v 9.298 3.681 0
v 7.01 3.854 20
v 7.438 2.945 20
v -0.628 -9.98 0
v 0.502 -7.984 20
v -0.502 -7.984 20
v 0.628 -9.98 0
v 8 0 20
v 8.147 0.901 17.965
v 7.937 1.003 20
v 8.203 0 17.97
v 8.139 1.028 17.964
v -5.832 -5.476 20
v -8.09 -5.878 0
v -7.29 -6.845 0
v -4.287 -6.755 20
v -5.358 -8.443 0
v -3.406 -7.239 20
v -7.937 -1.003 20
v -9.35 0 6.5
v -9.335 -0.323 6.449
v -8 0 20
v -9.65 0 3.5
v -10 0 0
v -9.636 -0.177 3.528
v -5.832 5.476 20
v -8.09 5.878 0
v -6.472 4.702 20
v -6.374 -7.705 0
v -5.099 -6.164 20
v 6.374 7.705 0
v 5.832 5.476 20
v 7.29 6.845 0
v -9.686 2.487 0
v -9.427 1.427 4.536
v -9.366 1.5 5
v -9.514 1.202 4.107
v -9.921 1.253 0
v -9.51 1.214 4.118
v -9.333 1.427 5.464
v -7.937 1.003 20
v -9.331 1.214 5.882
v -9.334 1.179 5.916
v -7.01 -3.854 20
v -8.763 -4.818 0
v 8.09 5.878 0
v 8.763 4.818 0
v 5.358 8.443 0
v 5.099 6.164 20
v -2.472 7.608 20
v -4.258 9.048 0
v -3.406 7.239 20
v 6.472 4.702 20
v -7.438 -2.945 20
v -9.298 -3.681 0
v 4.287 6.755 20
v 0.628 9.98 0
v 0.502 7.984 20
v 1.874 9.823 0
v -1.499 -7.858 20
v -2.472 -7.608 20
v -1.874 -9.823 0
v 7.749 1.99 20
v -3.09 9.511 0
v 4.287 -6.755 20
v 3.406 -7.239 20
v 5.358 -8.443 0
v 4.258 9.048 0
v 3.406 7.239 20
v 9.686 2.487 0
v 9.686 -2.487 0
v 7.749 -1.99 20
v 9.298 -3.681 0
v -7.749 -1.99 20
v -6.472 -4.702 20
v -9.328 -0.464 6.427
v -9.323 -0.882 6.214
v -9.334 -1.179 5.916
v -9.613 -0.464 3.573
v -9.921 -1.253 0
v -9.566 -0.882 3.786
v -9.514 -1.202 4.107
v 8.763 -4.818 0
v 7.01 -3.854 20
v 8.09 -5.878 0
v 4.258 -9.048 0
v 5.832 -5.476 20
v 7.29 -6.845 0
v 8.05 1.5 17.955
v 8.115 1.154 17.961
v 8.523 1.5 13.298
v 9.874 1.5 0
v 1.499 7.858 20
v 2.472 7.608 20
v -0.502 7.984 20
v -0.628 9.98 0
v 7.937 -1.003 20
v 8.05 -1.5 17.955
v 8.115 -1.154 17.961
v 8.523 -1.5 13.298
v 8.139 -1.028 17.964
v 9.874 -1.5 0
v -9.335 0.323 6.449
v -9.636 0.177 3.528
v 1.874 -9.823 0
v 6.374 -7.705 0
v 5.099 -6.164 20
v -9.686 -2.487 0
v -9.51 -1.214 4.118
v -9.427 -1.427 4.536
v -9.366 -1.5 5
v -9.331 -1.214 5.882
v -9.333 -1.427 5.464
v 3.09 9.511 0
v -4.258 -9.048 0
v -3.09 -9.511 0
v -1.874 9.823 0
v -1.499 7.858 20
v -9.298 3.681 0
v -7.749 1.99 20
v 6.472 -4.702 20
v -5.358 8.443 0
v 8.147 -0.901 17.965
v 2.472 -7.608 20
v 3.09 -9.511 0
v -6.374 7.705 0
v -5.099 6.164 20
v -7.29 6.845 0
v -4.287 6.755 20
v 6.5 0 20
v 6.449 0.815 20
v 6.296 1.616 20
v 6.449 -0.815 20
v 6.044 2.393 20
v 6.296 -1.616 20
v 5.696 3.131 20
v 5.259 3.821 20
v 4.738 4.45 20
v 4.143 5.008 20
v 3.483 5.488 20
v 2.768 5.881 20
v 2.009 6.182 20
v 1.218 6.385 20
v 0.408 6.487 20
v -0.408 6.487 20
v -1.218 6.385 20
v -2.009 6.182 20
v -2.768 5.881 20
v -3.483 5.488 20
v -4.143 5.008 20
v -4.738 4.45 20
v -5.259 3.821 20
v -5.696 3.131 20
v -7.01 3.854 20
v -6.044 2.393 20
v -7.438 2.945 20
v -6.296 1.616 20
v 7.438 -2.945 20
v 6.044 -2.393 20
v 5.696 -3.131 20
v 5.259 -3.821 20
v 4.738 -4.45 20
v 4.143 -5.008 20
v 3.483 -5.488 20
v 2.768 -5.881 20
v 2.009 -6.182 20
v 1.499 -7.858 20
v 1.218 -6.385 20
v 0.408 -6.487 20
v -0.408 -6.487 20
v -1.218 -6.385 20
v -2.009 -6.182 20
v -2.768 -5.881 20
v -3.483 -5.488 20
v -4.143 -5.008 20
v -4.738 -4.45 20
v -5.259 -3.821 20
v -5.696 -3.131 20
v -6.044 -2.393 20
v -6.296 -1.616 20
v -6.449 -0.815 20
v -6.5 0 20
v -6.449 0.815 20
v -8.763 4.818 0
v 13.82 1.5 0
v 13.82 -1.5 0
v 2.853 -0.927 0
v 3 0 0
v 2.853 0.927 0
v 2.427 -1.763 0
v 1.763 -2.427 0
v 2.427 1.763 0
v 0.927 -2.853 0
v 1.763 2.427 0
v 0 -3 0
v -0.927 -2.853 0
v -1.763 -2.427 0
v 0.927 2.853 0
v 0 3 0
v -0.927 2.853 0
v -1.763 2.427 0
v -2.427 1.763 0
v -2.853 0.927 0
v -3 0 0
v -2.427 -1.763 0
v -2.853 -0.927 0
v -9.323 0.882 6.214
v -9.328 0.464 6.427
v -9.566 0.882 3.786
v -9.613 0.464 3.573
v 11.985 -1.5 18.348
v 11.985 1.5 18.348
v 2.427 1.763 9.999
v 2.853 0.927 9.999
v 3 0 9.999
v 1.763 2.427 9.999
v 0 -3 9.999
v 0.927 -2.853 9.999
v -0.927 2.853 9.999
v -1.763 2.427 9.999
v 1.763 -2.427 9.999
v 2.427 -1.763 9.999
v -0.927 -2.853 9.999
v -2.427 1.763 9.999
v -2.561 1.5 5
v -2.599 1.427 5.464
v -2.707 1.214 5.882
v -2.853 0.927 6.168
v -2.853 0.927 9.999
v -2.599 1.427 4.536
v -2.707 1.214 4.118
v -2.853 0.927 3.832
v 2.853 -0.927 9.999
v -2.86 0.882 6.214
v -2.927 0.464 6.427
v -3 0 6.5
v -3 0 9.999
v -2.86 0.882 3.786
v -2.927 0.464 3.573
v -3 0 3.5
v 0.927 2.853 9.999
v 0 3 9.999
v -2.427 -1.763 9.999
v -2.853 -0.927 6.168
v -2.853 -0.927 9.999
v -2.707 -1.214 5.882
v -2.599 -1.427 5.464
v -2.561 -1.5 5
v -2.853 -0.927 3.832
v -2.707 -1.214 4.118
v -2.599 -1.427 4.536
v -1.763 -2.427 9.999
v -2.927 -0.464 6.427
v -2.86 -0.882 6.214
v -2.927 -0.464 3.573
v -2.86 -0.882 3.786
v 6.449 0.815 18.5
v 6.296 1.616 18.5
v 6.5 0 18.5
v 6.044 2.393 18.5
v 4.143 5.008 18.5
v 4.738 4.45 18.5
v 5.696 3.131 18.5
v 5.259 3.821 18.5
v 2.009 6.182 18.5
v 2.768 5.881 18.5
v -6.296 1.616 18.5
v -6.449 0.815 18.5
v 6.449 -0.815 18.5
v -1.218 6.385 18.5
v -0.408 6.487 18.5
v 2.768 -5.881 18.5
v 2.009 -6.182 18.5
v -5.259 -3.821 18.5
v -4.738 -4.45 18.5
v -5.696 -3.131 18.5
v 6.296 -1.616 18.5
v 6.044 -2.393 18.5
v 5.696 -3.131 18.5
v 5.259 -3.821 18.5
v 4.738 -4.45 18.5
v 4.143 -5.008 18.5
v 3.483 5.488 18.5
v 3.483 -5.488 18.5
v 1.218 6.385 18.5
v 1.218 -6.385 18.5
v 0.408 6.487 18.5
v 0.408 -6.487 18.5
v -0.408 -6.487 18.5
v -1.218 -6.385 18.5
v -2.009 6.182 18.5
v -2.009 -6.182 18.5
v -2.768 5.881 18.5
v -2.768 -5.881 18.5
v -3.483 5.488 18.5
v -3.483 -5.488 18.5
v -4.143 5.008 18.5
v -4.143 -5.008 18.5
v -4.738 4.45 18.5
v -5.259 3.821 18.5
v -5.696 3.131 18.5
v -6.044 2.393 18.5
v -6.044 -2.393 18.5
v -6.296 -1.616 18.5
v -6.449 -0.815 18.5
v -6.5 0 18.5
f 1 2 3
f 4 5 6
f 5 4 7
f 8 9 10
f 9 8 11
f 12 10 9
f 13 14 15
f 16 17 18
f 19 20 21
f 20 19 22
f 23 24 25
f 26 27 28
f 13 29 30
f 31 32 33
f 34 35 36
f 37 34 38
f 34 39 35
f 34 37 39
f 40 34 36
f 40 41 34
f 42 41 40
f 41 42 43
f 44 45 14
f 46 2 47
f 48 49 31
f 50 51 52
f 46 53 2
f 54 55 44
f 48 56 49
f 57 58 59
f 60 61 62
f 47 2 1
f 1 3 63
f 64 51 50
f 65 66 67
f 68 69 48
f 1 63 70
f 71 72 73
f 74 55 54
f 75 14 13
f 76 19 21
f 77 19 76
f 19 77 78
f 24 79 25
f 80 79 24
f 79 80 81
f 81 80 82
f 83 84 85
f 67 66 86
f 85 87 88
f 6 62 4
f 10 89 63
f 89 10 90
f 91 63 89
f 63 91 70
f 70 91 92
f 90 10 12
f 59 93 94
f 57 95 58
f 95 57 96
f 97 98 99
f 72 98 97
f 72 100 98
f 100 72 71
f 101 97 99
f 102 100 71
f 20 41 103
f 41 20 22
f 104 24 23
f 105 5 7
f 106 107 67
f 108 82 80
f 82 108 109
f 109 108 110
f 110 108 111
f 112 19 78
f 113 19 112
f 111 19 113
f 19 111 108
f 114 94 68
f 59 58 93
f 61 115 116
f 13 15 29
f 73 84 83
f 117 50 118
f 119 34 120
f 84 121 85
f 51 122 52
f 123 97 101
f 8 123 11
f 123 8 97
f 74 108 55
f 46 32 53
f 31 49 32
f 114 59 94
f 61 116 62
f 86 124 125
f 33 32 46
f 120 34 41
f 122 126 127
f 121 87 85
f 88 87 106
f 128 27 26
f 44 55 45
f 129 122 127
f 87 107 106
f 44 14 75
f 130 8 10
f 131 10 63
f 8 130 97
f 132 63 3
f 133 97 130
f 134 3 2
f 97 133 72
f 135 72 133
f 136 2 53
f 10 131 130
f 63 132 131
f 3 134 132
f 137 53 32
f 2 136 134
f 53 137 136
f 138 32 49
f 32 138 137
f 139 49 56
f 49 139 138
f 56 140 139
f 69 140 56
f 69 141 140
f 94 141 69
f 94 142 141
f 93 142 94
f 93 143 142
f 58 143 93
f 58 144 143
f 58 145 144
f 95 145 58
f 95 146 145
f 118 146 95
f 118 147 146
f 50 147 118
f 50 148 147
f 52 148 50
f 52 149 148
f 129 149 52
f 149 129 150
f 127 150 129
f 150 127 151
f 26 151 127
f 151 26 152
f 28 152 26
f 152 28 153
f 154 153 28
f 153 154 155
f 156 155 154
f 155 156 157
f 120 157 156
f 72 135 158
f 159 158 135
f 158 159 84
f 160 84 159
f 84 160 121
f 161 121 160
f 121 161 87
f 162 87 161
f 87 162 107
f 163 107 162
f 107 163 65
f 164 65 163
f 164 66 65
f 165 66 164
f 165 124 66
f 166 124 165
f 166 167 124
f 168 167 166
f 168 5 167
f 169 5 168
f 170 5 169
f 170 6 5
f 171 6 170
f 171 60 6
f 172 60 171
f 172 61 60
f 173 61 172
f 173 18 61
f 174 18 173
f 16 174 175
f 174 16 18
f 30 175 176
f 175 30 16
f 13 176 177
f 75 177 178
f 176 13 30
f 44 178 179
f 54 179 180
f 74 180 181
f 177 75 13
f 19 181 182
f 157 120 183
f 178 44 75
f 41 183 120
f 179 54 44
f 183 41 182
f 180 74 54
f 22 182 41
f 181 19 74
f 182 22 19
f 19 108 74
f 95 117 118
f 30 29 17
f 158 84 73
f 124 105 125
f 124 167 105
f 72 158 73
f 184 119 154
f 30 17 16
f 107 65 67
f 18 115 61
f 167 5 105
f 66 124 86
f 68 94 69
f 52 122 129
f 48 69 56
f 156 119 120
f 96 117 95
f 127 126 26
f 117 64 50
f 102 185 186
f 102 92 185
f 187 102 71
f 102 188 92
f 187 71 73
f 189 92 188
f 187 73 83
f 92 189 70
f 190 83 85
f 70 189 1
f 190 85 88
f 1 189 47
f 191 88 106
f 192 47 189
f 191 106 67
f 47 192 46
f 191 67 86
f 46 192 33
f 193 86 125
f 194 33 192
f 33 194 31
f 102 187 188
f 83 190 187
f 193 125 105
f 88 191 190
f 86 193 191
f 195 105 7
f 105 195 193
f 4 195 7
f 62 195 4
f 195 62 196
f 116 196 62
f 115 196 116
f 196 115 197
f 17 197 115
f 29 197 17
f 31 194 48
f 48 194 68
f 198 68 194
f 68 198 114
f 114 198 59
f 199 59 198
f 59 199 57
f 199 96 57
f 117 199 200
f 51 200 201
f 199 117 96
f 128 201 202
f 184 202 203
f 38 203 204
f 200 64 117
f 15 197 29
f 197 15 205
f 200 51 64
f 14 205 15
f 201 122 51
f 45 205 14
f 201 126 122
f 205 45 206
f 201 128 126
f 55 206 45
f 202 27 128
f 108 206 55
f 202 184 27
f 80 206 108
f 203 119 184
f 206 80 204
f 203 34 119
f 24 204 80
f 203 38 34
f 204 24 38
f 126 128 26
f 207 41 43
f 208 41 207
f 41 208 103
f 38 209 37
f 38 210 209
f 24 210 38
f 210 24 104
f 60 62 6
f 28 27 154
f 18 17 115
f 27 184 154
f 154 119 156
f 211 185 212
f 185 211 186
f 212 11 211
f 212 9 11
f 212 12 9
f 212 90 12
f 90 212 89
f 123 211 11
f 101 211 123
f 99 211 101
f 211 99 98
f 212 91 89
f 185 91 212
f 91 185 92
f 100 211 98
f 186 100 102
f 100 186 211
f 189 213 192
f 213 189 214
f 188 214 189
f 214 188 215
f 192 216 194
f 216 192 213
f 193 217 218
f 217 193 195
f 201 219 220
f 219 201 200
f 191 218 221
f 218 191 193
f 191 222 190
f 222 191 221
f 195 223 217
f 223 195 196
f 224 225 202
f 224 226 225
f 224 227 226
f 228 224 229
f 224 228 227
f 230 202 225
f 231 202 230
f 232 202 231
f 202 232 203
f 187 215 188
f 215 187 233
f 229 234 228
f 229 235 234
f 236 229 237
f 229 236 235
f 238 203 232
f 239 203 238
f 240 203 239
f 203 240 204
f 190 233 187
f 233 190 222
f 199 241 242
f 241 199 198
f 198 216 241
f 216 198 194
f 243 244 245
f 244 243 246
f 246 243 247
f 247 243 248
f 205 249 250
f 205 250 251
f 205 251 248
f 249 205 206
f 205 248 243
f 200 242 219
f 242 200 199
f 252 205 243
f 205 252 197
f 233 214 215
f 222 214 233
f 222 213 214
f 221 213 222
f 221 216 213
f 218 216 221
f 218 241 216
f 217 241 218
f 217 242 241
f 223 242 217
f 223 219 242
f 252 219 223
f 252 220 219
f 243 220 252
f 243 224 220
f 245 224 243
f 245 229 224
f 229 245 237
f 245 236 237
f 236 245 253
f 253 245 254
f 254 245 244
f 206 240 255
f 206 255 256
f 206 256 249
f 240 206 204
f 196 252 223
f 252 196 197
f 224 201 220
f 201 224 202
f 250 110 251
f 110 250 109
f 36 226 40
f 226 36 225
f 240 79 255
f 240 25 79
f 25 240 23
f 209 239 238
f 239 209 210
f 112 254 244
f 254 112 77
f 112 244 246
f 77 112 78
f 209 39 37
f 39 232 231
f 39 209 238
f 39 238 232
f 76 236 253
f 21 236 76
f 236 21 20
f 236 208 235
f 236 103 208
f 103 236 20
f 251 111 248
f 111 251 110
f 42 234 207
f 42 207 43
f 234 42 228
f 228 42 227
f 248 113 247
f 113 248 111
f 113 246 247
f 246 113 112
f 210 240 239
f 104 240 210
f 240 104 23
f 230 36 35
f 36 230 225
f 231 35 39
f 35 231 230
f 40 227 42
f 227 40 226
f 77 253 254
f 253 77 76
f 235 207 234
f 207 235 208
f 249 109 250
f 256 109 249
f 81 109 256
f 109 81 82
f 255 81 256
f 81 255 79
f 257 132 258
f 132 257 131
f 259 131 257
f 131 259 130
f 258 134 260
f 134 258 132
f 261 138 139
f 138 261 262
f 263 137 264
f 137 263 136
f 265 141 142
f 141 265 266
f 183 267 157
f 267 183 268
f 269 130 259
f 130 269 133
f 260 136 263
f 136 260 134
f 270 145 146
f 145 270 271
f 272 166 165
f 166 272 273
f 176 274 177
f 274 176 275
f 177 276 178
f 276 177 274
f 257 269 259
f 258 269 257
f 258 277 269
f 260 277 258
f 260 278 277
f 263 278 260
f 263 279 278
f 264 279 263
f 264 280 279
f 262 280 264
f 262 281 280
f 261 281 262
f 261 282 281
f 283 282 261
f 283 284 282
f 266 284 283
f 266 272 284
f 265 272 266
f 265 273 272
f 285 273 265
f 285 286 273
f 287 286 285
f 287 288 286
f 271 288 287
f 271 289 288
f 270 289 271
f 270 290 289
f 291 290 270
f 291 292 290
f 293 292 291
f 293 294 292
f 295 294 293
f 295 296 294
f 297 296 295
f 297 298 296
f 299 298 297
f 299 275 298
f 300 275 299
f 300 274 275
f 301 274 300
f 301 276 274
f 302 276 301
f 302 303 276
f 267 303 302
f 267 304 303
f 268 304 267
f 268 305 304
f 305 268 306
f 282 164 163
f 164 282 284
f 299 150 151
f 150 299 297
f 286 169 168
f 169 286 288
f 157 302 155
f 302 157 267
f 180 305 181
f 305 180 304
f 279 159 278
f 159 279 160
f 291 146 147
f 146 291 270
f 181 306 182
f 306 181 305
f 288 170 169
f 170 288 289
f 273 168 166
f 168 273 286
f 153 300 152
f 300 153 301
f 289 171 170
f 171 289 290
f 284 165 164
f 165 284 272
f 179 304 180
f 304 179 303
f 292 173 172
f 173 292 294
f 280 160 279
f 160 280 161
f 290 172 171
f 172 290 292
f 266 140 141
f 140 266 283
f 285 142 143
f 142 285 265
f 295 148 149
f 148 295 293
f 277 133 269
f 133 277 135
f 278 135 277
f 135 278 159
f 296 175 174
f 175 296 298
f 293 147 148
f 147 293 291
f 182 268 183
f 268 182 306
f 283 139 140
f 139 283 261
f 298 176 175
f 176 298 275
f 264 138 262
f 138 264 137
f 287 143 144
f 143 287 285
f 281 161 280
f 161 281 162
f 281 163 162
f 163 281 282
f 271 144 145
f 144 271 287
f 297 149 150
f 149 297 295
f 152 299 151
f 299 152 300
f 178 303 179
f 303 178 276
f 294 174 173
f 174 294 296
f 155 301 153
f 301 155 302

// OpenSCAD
//////////////////////////
// Customizable settings
//////////////////////////


// Diameter of the hole on the bottom (in mm).
HoleDiameter = 6;

// Depth of the hole in the bottom (in mm).  If you want the hole to go all the way through then set this to a number larger than the total height of the object.
HoleDepth = 10;

// If you want a D-shaped hole, set this to the thickness of the flat side (in mm).  Larger values for the flat make the hole smaller.
HoleFlatThickness = 0;

// Height (in mm).  If dome cap is selected, it is not included in height.  The shaft length is also not counted.
KnobHeight = 20;

// Diameter of base of round part of knob (in mm).  (Knurled ridges are not included in this measurement.)
KnobDiameter = 20;

// Shape of top of knob.  "Recessed" type can be painted.
CapType = 1;	// [0:Flat, 1:Recessed, 2:Dome]

// Do you want a large timer-knob style pointer?
TimerKnob=0;	// [0:No, 1:Yes]

// Would you like a divot on the top to indicate direction?
Pointer1 = 0;	// [0:No, 1:Yes]

// Would you like a line (pointer) on the front to indicate direction?
Pointer2 = 1;	// [0:No, 1:Yes]

// Do you want finger ridges around the knob?
Knurled = 0;	// [0:No, 1:Yes]

// 0 = A cylindrical knob, any other value will taper the knob.
TaperPercentage = 20;		// [0:0%, 10:10%, 20:20%, 30:30%, 40:40%, 50:50%]

// Width of "dial" ring (in mm).  Set to zero if you don't want the ring.
RingWidth = 0;

// The number of markings on the dial.  Set to zero if you don't want markings.  (RingWidth must be non-zero.)
RingMarkings = 10;

// diameter of the hole for the setscrew (in mm).  If you don't need a hole, set this to zero.
ScrewHoleDiameter = 3;

// Length of the shaft on the bottom of the knob (in mm).  If you don't want a shaft, set this value to zero.
ShaftLength = 0;

// Diameter of the shaft on the bottom of the knob (in mm).  (ShaftLength must be non-zero.)
ShaftDiameter = 10;

// Would you like a notch in the shaft?  It can be used for a press-on type knob (rather than using a setscrew).  (ShaftLength must be non-zero.)
NotchedShaft = 0;	// [0:No, 1:Yes]



//////////////////////////
//Advanced settings
//////////////////////////

RingThickness = 5*1;
DivotDepth = 1.5*1;
MarkingWidth = 1.5*1;
DistanceBetweenKnurls = 3*1;
TimerKnobConst = 1.8*1;



//////////////////////////
//Calculations
//////////////////////////

PI=3.14159265*1;
KnobMajorRadius = KnobDiameter/2;
KnobMinorRadius = KnobDiameter/2 * (1 - TaperPercentage/100);
KnobRadius = KnobMinorRadius + (KnobMajorRadius-KnobMinorRadius)/2;
KnobCircumference = PI*KnobDiameter;
Knurls = round(KnobCircumference/DistanceBetweenKnurls);
Divot=CapType;

TaperAngle=asin(KnobHeight / (sqrt(pow(KnobHeight, 2) +
		pow(KnobMajorRadius-KnobMinorRadius,2)))) - 90;

DivotRadius = KnobMinorRadius*.4;


union()
{
translate([0, 0, (ShaftLength==0)? 0 : ShaftLength-0.001])
difference()
{
union()
{
	// Primary knob cylinder
	cylinder(h=KnobHeight, r1=KnobMajorRadius, r2=KnobMinorRadius,
			$fn=50);
	
	if (Knurled)
		for (i=[0 : Knurls-1])
			rotate([0, 0, i * (360/Knurls)])
				translate([KnobRadius, 0, KnobHeight/2])
					rotate([0, TaperAngle, 0]) rotate([0, 0, 45])
						cube([2, 2, KnobHeight+.001], center=true);

 	if (RingMarkings>0)
		for (i=[0 : RingMarkings-1])
			rotate([0, 0, i * (360/RingMarkings)])
				translate([KnobMajorRadius + RingWidth/2, 0, 1])
					cube([RingWidth*.5, MarkingWidth, 2], center=true);		
	
	if (Pointer2==1)
		translate([KnobRadius, 0, KnobHeight/2-2])
			rotate([0, TaperAngle, 0])
				cube([8, 3, KnobHeight], center=true);		

	if (RingWidth>0)
		translate([0, 0, RingThickness/2])
			cylinder(r1=KnobMajorRadius + RingWidth, r2=KnobMinorRadius,
					h=RingThickness, $fn=50, center=true);

	if (Divot==2)
		translate([0, 0, KnobHeight])
			difference()
			{
				scale([1, 1, 0.5])
					sphere(r=KnobMinorRadius, $fn=50, center=true);

				translate([0, 0, 0-(KnobMinorRadius+.001)])
					cube([KnobMinorRadius*2.5, KnobMinorRadius*2.5,
							KnobMinorRadius*2], center=true);
			}

	if (TimerKnob==1) intersection()
		{
			translate([0, 0, 0-(KnobDiameter*TimerKnobConst) + KnobHeight])
			sphere(r=KnobDiameter*TimerKnobConst, $fn=50, center=true);		
	
			translate([0-(KnobDiameter*TimerKnobConst)*0.1, 0,
					KnobHeight/2])
				scale([1, 0.5, 1])
					cylinder(h=KnobHeight, r=(KnobDiameter*TimerKnobConst) *
							0.8, $fn=3, center=true);
		}
}

// Pointer1: Offset hemispherical divot
if (Pointer1==1)
	translate([KnobMinorRadius*.55, 0, KnobHeight + DivotRadius*.6])
		sphere(r=DivotRadius, $fn=40);

// Divot1: Centered cylynrical divot
if (Divot==1)
	translate([0, 0, KnobHeight])
		cylinder(h=DivotDepth*2, r=KnobMinorRadius-1.5, $fn=50,
				center=true);

if (ShaftLength==0)
{
	// Hole for shaft
	translate([0, 0, HoleDepth/2 - 0.001])
		difference()
		{
			cylinder(r=HoleDiameter/2, h=HoleDepth, $fn=20,
					center=true);
	
			// Flat for D-shaped hole
			translate([(0-HoleDiameter)+HoleFlatThickness, 0, 0])
				cube([HoleDiameter, HoleDiameter, HoleDepth+.001],
						center=true);
		}
	
	// Hole for setscrew
	if (ScrewHoleDiameter>0)
		translate([0 - (KnobMajorRadius+RingWidth+1)/2, 0,
				HoleDepth/2])
			rotate([0, 90, 0])
			cylinder(h=(KnobMajorRadius+RingWidth+1),
					r=ScrewHoleDiameter/2, $fn=20, center=true);
}

// Make sure bottom ends at z=0
translate([0, 0, -10])
	cube([(KnobMajorRadius+RingWidth) * 3,
			(KnobMajorRadius+RingWidth) * 3, 20], center=true);
}

if (ShaftLength>0)
	difference()
	{
		translate([0, 0, ShaftLength/2])
			cylinder(h=ShaftLength, r=ShaftDiameter/2, $fn=20,
					center=true);

		if (NotchedShaft==1)
		{
			cube([HoleDiameter/2, ShaftDiameter*2, ShaftLength],
					center=true);
		}

		// Hole for shaft
		translate([0, 0, HoleDepth/2 - 0.001])
			difference()
			{
				cylinder(r=HoleDiameter/2, h=HoleDepth, $fn=20,
						center=true);
		
				// Flat for D-shaped hole
				translate([(0-HoleDiameter)+HoleFlatThickness, 0, 0])
					cube([HoleDiameter, HoleDiameter, HoleDepth+.001],
							center=true);
			}
		
		// Hole for setscrew
		if (ScrewHoleDiameter>0)
			translate([0 - (KnobMajorRadius+RingWidth+1)/2, 0,
					HoleDepth/2])
				rotate([0, 90, 0])
				cylinder(h=(KnobMajorRadius+RingWidth+1),
						r=ScrewHoleDiameter/2, $fn=20, center=true);
	}
}
